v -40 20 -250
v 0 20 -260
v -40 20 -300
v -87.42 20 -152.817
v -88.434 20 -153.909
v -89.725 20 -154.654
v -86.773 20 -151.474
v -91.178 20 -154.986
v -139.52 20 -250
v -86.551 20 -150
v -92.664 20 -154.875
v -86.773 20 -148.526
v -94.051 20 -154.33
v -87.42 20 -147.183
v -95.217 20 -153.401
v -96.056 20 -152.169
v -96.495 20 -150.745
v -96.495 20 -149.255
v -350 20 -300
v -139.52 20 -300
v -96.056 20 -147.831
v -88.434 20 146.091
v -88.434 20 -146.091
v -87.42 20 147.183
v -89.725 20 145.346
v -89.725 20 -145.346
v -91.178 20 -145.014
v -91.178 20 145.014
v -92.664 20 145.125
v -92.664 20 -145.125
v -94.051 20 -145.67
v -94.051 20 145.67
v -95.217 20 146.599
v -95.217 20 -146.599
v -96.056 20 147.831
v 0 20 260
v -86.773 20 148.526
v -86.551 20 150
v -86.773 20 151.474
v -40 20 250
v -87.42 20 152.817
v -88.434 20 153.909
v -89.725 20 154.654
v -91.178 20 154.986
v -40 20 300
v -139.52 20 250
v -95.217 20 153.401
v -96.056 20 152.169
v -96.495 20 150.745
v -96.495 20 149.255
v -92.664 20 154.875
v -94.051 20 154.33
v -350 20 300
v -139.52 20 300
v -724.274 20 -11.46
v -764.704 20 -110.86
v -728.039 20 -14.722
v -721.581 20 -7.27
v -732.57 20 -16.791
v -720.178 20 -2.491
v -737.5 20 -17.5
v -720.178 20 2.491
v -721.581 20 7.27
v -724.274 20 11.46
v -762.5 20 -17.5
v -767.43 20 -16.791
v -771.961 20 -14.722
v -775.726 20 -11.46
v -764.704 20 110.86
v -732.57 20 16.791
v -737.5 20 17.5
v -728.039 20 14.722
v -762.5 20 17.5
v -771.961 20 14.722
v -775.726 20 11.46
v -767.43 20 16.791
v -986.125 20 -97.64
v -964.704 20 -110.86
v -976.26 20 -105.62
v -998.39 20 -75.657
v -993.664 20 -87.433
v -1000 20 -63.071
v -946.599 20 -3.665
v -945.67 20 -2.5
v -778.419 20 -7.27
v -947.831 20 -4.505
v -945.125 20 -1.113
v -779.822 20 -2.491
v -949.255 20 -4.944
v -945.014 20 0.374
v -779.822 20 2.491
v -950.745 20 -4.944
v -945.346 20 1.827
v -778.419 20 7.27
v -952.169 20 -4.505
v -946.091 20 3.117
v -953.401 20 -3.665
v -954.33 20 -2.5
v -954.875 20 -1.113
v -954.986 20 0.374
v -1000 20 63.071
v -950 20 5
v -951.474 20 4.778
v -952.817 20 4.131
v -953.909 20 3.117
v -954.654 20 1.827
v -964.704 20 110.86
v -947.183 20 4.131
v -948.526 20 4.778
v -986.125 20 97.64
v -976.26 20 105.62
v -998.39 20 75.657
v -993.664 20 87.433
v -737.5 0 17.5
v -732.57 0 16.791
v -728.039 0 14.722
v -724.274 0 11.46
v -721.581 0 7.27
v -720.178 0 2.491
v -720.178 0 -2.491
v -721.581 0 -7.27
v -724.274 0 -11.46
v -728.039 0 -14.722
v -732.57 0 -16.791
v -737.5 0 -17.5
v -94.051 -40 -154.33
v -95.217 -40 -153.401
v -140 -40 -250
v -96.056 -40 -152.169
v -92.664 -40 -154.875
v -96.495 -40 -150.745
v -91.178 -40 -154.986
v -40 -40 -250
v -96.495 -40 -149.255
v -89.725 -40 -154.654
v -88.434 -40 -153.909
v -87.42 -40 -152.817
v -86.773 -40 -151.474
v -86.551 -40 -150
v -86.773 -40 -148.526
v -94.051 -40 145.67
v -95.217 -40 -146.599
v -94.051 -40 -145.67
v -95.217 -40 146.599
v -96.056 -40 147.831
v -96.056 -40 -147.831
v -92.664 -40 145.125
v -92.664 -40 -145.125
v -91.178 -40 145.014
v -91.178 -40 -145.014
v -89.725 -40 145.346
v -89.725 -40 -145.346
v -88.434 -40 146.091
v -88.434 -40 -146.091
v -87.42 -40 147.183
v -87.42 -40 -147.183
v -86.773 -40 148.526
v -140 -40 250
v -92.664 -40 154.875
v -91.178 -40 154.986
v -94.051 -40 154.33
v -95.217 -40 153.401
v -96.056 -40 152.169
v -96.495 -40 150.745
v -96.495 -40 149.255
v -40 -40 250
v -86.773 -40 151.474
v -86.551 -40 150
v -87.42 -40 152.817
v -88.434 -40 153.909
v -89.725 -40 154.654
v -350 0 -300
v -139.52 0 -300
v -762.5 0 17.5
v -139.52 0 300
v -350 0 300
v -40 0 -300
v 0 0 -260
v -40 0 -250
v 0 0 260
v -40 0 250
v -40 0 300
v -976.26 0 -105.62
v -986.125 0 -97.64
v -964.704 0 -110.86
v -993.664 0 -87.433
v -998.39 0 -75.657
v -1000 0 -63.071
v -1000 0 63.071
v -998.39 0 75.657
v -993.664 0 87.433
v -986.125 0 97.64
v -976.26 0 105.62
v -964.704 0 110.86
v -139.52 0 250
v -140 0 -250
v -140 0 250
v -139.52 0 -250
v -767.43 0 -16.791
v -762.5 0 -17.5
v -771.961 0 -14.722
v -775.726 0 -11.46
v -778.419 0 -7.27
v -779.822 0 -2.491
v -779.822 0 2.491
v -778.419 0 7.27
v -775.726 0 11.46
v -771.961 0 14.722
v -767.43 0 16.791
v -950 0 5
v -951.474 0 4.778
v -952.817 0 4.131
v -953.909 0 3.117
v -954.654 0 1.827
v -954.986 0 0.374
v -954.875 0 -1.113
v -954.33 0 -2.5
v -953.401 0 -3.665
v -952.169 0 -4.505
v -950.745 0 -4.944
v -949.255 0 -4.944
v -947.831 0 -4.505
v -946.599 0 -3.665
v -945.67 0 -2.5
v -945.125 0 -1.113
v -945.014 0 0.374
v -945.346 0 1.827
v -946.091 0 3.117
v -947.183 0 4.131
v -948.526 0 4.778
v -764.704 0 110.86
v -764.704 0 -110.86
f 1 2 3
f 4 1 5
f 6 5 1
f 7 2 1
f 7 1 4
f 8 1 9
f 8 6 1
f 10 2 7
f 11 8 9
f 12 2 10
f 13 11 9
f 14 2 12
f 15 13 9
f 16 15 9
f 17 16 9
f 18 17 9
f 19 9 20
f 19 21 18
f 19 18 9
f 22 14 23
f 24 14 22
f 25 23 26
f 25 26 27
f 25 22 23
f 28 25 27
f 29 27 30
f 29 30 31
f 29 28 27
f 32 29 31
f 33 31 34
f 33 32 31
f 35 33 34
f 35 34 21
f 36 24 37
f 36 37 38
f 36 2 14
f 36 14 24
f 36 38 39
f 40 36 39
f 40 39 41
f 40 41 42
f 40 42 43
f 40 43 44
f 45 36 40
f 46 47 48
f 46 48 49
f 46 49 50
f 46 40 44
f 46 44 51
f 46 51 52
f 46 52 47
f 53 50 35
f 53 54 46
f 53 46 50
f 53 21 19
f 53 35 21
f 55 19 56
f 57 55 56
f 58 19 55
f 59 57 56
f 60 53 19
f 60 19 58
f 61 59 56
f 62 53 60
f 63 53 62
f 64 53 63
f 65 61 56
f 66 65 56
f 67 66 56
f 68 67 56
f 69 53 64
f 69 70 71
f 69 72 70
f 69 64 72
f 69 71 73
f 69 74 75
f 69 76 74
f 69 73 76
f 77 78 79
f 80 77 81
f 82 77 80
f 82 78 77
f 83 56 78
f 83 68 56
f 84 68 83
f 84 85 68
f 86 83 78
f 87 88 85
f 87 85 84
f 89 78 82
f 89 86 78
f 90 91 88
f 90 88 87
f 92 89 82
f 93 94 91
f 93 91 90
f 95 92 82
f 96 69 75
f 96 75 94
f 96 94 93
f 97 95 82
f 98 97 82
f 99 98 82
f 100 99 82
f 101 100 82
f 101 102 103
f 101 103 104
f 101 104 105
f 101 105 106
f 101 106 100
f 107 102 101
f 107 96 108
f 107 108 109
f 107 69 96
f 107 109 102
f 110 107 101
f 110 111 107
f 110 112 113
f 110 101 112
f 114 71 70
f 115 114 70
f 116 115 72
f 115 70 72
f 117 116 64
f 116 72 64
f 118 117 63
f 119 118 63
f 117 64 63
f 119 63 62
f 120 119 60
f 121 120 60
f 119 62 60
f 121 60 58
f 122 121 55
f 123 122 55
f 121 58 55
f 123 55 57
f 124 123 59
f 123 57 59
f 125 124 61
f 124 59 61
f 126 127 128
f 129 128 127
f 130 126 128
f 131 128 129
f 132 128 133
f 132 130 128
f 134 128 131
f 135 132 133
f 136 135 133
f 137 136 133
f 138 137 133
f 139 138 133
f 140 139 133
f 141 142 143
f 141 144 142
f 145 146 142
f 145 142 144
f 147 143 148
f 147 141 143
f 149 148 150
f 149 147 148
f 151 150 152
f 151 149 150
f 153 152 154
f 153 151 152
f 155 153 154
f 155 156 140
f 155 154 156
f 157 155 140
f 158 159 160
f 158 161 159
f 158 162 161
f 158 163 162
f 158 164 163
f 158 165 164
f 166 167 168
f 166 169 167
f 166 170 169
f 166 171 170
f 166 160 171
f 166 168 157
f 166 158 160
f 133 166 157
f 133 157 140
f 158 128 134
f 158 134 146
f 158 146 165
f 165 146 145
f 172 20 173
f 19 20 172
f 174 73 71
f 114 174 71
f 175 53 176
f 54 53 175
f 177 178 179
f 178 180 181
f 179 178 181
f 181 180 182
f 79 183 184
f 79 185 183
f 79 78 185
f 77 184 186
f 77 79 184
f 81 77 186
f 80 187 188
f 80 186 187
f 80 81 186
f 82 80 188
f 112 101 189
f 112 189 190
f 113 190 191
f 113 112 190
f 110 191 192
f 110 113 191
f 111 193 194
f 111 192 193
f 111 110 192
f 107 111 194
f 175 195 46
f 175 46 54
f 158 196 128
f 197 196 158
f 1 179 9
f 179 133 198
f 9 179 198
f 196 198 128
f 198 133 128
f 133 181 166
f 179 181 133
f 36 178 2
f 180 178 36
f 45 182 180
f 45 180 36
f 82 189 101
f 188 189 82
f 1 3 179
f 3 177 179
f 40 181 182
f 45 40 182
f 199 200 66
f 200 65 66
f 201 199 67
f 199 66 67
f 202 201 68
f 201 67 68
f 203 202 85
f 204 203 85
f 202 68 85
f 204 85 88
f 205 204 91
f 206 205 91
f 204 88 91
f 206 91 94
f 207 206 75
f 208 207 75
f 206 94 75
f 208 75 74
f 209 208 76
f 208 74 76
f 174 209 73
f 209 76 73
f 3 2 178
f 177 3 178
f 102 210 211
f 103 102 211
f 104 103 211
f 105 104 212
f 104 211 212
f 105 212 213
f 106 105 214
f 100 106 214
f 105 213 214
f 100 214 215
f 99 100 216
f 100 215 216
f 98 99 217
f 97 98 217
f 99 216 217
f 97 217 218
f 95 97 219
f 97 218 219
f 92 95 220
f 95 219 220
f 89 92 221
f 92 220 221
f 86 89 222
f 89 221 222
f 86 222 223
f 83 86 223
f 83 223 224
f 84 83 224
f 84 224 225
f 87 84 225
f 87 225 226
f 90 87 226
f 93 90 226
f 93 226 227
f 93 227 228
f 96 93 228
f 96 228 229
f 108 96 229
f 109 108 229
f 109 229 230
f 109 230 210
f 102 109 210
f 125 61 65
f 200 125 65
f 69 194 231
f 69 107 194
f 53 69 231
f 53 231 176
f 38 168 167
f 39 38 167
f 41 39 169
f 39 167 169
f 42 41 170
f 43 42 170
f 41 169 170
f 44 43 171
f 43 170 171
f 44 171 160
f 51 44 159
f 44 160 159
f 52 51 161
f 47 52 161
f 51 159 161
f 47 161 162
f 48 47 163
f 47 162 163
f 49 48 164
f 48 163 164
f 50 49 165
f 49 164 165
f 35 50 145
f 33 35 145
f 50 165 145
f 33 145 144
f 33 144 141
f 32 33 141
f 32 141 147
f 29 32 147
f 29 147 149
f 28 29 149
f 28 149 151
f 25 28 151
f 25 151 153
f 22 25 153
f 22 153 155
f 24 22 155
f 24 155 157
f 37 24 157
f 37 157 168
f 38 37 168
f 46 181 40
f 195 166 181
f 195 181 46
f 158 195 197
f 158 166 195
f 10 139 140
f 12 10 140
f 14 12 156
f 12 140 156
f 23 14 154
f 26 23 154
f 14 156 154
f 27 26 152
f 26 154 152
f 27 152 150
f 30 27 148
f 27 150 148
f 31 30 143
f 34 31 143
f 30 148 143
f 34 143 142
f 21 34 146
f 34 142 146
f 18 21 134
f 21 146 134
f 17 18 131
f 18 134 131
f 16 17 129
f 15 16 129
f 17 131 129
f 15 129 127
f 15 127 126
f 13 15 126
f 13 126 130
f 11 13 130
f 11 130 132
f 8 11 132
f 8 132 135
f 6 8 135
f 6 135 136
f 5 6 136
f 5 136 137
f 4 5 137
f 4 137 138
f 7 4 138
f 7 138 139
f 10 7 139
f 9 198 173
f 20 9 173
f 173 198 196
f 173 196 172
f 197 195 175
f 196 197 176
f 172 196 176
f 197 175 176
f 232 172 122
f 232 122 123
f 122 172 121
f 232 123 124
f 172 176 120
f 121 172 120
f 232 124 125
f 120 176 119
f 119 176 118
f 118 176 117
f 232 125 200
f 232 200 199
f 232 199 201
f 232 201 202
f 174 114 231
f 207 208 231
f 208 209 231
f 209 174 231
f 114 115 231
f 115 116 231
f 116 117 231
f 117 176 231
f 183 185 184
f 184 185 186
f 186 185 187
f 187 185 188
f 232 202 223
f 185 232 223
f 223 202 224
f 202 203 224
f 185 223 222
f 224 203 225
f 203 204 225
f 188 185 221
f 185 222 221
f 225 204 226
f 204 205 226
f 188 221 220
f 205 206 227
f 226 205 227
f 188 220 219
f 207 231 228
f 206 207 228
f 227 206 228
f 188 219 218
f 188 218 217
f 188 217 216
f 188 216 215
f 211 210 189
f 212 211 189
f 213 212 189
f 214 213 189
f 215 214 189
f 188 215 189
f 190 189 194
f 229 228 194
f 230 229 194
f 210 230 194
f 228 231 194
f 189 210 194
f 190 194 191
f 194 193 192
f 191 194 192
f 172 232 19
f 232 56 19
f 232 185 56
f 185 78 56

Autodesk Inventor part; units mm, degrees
ref_plane "YZ Plane" through (0, 0, 0) normal (1, 0, 0) x (0, 1, 0)
ref_plane "XZ Plane" through (0, 0, 0) normal (0, 1, 0) x (-1, 0, 0)
ref_plane "XY Plane" through (0, 0, 0) normal (0, 0, 1) x (1, 0, 0)
sketch "Sketch1" plane through (0, 0, 0) normal (0, 1, 0) x (-1, 0, 0)
  line L0 (0, 0) -> (0, 300)
  line L1 (0, 300) -> (350, 300)
  line L2 (350, 300) -> (1000, 100)
  line L3 (0, 0) -> (1000, 0)
  line L4 (1000, 100) -> (1000, 0)
  line L5 (0, 0) -> (0, -300)
  line L6 (0, -300) -> (350, -300)
  line L7 (350, -300) -> (1000, -100)
  line L8 (1000, -100) -> (1000, 0)
  line L9 (350, 300) -> (350, -300)
  dimension "d12" = 300
  dimension "d13" = 350
  dimension "d16" = 100
extrude "Extrusion1" add sketch "Sketch1" along normal blind 20
fillet "Fillet1" radius 50 1 edges at (-1000, 10, 100)
fillet "Fillet2" radius 50 1 edges at (-1000, 10, -100)
chamfer "Chamfer1" distance 40 angle 45 1 edges at (0, 10, -300)
chamfer "Chamfer2" distance 40 angle 45 1 edges at (0, 10, 300)
sketch "Sketch3" plane through (0, 20, 0) normal (0, 1, 0) x (1, 0, 0)
  point P0 (0, 0)
sketch "Sketch4" plane through (0, 20, 0) normal (0, 1, 0) x (1, 0, 0)
  point P0 (0, 0)
sketch "Sketch5" plane through (0, 20, 0) normal (0, 1, 0) x (1, 0, 0)
  line L0 (-780, 0) -> (-720, 0) construction
  line L1 (-762.5, -17.5) -> (-737.5, -17.5)
  line L2 (-737.5, 17.5) -> (-762.5, 17.5)
  arc A0 (-762.5, 17.5) -> (-762.5, -17.5) centre (-762.5, 0) ccw
  arc A1 (-737.5, -17.5) -> (-737.5, 17.5) centre (-737.5, 0) ccw
  line L3 (-1000, 63.0713) -> (-1000, -63.0713) projected
  point P0 (0, 0)
  point P1 (-750, 0)
  dimension "d27" = 60
  dimension "d28" = 35
extrude "Extrusion2" cut sketch "Sketch5" against normal blind 20
sketch "Sketch6" plane through (0, 20, 0) normal (0, 1, 0) x (1, 0, 0)
  line L0 (-1000, 63.0713) -> (-1000, -63.0713) projected
  line L1 (-1000, 0) -> (-950, 0)
  point P0 (0, 0)
  dimension "d33" = 50
hole "Hole1" at (-950, 20, 0) direction (0, -1, 0) diameter 10 end through all
sketch "Sketch7" plane through (0, 0, 0) normal (0, -1, 0) x (1, 0, 0)
  line L0 (-350, 300) -> (-40, 300) projected
  line L1 (0, -260) -> (-40, -300) projected
  line L2 (-40, 300) -> (-40, -300)
  line L3 (-40, -300) -> (-140, -300)
  line L4 (-140, -300) -> (-140, 300)
  line L5 (-140, 300) -> (-40, 300)
  point P0 (0, 0)
  dimension "d41" = 100
extrude "Extrusion3" add sketch "Sketch7" along normal blind 40
sketch "Sketch8" plane through (0, -40, 0) normal (0, -1, 0) x (1, 0, 0)
  line L0 (-350, 300) -> (-40, 300) projected
  circle A0 centre (-91.5513, 150) radius 5
  line L1 (-40, -300) -> (-40, 300) projected
  line L2 (-40, 0) -> (-140, 0)
  line L3 (-140, -300) -> (-140, 300) projected
  circle A1 centre (-91.5513, -150) radius 5
  point P0 (0, 0)
  dimension "d45" = 10
extrude "Extrusion4" cut sketch "Sketch8" against normal blind 60 contours A0 | A1
sketch "Sketch9" plane through (0, -40, 0) normal (0, -1, 0) x (1, 0, 0)
  line L0 (-40, -300) -> (-350, -300) projected
  line L1 (-139.5196, -300) -> (-39.5196, -300)
  line L2 (-39.5196, -300) -> (-39.5196, -250)
  line L3 (-39.5196, -250) -> (-139.5196, -250)
  line L4 (-139.5196, -250) -> (-139.5196, -300)
  line L5 (-40, -300) -> (-40, 300) projected
  line L6 (-40, 0) -> (-139.5196, 0)
  line L7 (-40, 300) -> (-350, 300)
  line L8 (-39.5196, 300) -> (-39.5196, 250)
  line L9 (-39.5196, 250) -> (-139.5196, 250)
  line L10 (-139.5196, 250) -> (-139.5196, 300)
  point P0 (0, 0)
  point P1 (-40, 250)
  point P2 (-40, -250)
  dimension "d48" = 100
  dimension "d49" = 50
extrude "Extrusion5" cut sketch "Sketch9" against normal blind 60 contours L0 L4 L3 L5 | L9 L10 L7 L5
sketch "Sketch10" plane through (0, 20, 0) normal (0, 1, 0) x (1, 0, 0)
  line L0 (-350, 300) -> (-964.7043, 110.8602) projected
  line L1 (-964.7043, 110.8602) -> (-764.7043, 110.8602)
  line L2 (-764.7043, 110.8602) -> (-350, 300)
  line L3 (-964.7043, -110.8602) -> (-350, -300) projected
  line L4 (-964.7043, -110.8602) -> (-764.7043, -110.8602)
  line L5 (-764.7043, -110.8602) -> (-350, -300)
  point P0 (0, 0)
  dimension "d53" = 200
extrude "Extrusion6" cut sketch "Sketch10" against normal blind 20
sketch "Sketch11" plane through (-139.5196, -40, 300) normal (1, 0, 0) x (0, 0, -1)
  line L0 (600, 40) -> (0, 40) projected
  line L1 (0, 40) -> (50, 40)
  line L2 (50, 0) -> (50, 60) projected
  line L3 (50, 0) -> (50, 40)
  line L4 (0, 0) -> (600, 0) projected
  line L5 (0, 40) -> (0, 0)
  line L6 (0, 0) -> (50, 0)
  point P0 (300, 40)
extrude "Extrusion7" cut sketch "Sketch11" against normal blind 1
sketch "Sketch12" plane through (-139.5196, -40, -250) normal (1, 0, 0) x (0, 0, -1)
  line L0 (50, 0) -> (0, 0) projected
  line L1 (0, 0) -> (0, 40) projected
  line L2 (50, 0) -> (0, 0)
  line L3 (0, 0) -> (0, 40)
  line L4 (0, 40) -> (50, 40)
  line L5 (50, 40) -> (50, 0)
  point P0 (-250, 40)
extrude "Extrusion8" cut sketch "Sketch12" against normal blind 1
properties part number "Base"
